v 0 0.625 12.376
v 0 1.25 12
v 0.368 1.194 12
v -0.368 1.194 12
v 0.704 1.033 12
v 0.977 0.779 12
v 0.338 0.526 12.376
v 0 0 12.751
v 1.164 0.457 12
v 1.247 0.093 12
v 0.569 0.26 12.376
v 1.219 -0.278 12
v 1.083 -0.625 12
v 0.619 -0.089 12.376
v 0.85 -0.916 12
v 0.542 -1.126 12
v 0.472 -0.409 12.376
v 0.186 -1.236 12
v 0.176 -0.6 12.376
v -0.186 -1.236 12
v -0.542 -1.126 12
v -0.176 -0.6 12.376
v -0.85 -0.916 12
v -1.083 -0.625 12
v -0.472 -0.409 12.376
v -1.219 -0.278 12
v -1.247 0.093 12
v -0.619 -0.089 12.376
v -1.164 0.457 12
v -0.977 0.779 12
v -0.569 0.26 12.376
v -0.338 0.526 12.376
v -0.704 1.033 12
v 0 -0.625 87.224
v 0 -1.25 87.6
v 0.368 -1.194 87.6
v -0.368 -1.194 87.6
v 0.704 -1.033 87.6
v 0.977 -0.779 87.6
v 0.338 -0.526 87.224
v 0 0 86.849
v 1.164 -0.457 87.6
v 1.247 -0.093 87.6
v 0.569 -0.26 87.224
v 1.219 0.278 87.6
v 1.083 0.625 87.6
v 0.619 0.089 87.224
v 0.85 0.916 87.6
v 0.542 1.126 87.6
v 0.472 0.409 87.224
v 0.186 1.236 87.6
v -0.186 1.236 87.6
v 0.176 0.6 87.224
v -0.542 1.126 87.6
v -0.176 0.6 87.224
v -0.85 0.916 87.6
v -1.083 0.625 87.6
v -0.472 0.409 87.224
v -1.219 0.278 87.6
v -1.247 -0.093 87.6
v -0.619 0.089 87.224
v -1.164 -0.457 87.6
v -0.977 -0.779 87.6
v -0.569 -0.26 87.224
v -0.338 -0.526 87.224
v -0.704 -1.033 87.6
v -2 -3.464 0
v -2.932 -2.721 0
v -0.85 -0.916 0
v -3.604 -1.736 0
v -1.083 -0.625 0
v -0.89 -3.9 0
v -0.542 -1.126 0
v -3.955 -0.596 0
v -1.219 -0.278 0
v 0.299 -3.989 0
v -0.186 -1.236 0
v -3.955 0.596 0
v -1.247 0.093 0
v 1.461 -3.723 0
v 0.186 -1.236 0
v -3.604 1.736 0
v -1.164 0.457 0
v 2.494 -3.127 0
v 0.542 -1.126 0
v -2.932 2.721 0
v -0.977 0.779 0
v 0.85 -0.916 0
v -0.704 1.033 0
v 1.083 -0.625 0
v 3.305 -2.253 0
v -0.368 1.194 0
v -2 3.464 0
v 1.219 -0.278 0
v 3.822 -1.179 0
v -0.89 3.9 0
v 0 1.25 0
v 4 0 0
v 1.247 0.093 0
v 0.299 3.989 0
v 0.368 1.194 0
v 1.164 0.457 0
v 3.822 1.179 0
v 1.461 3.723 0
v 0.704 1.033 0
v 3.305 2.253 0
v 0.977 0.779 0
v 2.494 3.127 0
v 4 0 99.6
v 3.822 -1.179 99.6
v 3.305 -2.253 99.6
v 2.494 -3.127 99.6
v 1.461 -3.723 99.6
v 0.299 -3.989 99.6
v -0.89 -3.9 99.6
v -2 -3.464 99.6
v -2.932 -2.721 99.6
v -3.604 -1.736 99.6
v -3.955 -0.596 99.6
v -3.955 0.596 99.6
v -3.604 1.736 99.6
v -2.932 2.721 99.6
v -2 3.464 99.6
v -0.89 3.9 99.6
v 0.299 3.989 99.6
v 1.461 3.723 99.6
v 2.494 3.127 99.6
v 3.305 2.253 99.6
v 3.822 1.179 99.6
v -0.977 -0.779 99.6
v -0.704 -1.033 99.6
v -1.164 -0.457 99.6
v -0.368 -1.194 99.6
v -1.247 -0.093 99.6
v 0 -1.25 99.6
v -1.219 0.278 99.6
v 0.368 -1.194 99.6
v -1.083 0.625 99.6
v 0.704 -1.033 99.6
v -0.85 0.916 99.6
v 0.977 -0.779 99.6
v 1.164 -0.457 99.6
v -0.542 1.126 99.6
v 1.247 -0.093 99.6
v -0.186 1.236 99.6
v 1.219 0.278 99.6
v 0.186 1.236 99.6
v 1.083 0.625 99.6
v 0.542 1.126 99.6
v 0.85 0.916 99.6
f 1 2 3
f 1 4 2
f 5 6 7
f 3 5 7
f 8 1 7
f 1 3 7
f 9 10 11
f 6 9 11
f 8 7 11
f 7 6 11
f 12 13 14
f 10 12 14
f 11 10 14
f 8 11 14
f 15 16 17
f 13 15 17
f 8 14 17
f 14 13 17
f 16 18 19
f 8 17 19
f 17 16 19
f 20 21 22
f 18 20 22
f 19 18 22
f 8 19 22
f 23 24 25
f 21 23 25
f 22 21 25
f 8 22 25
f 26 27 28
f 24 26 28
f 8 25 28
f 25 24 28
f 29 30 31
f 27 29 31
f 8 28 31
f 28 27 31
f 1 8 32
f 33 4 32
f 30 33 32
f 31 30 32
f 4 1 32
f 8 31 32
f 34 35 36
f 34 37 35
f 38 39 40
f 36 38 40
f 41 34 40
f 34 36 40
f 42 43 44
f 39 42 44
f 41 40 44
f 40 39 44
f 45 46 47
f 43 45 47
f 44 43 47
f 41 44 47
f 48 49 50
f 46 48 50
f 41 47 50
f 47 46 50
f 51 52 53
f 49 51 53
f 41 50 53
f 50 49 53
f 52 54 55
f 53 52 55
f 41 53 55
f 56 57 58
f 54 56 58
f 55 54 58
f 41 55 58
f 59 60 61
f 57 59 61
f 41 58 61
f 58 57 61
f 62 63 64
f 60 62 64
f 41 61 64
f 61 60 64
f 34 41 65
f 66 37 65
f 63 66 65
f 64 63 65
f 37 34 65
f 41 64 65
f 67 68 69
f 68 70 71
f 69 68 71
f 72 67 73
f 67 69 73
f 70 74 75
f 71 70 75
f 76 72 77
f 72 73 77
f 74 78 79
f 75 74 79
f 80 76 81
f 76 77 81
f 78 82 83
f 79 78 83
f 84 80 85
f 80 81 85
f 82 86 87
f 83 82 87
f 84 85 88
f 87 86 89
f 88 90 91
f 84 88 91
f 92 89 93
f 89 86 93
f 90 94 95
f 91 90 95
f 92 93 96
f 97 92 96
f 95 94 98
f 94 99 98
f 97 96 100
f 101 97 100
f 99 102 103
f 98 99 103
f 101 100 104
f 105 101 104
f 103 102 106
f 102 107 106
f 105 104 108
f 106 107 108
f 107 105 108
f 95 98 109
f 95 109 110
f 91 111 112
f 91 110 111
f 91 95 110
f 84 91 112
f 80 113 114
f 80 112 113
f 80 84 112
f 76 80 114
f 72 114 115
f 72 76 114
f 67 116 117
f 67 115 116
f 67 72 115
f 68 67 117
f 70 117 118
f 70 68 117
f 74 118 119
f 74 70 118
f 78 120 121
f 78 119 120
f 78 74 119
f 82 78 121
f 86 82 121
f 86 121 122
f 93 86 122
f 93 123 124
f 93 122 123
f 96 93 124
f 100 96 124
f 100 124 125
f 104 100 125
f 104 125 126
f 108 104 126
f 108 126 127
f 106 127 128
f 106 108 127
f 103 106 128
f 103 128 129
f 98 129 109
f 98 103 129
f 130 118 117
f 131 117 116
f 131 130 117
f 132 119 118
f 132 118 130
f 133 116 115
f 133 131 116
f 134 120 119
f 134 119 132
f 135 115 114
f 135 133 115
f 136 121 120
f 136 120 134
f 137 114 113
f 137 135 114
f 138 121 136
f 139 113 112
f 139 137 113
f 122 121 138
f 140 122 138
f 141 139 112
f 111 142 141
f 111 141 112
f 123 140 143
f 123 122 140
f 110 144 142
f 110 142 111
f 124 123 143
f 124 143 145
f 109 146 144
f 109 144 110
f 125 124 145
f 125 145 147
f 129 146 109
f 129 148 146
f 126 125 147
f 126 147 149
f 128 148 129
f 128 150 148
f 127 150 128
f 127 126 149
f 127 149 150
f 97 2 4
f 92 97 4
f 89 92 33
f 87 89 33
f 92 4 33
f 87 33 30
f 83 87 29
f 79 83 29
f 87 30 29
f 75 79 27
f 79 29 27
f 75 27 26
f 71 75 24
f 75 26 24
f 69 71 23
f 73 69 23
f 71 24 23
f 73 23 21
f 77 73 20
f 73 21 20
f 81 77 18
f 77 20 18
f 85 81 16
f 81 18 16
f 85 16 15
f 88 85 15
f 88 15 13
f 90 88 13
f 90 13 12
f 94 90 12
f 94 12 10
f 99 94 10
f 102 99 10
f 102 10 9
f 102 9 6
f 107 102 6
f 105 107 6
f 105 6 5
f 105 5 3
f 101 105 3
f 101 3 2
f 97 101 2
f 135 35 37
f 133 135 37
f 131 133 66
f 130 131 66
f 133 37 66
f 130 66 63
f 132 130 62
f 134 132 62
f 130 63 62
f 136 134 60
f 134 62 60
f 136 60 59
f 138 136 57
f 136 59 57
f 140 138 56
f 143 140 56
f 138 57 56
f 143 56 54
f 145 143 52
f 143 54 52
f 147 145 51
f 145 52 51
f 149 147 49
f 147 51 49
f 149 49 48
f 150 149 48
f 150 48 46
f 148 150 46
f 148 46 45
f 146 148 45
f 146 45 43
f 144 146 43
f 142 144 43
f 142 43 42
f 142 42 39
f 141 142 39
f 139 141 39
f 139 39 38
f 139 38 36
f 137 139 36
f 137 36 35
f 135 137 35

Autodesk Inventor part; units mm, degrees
ref_plane "YZ Plane" through (0, 0, 0) normal (1, 0, 0) x (0, 1, 0)
ref_plane "XZ Plane" through (0, 0, 0) normal (0, 1, 0) x (-1, 0, 0)
ref_plane "XY Plane" through (0, 0, 0) normal (0, 0, 1) x (1, 0, 0)
sketch "スケッチ1" plane through (0, 0, 0) normal (0, 0, 1) x (1, 0, 0)
  circle A0 centre (0, 0) radius 4
  dimension "d0" = 8
extrude "押し出し1" add sketch "スケッチ1" along normal blind 99.6
sketch "スケッチ2" plane through (0, 0, 99.6) normal (0, 0, 1) x (1, 0, 0)
  circle A0 centre (0, 0) radius 4 projected
hole "穴1" at (0, 0, 99.6) direction (0, 0, -1) diameter 2.5 depth 12 tip angle 118
sketch "スケッチ3" plane through (0, 0, 0) normal (0, 0, -1) x (-1, 0, 0)
  circle A0 centre (0, 0) radius 4 projected
hole "穴2" at (0, 0, 0) direction (0, 0, 1) diameter 2.5 depth 12 tip angle 118
properties part number "シャフト" material "ポリカーボネート、クリア"
